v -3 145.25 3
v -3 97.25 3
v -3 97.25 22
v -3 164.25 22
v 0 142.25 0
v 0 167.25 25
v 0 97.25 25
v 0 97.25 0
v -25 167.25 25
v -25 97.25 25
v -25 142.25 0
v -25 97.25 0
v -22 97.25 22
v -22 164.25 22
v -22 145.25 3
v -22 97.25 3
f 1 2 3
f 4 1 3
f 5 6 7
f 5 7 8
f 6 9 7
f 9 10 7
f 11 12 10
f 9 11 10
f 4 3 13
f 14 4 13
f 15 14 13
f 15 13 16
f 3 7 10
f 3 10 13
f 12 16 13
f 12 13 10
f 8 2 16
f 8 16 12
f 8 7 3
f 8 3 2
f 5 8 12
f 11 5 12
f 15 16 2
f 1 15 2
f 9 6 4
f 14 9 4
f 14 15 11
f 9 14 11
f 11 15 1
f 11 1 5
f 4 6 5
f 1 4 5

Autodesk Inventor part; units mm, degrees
ref_plane "YZ Plane" through (0, 0, 0) normal (1, 0, 0) x (0, 1, 0)
ref_plane "XZ Plane" through (0, 0, 0) normal (0, 1, 0) x (-1, 0, 0)
ref_plane "XY Plane" through (0, 0, 0) normal (0, 0, 1) x (1, 0, 0)
sketch "Sketch1" plane through (0, 0, 0) normal (0, 1, 0) x (-1, 0, 0)
  line L0 (0, 0) -> (25, 0)
  line L1 (25, 0) -> (25, 25)
  line L2 (25, 25) -> (0, 25)
  line L3 (0, 25) -> (0, 0)
  line L4 (22, 22) -> (22, 3)
  line L5 (22, 3) -> (3, 3)
  line L6 (3, 3) -> (3, 22)
  line L7 (3, 22) -> (22, 22)
  dimension "d0" = 25
  dimension "d1" = 25
  dimension "d2" = 3
extrude "Extrusion1" add sketch "Sketch1" along normal blind 167.25
sketch "Sketch4" plane through (0, 0, 25) normal (1, 0, 0) x (0, 0, -1)
  line L0 (0, 0) -> (25, 0) projected
  line L1 (25, 0) -> (25, 167.25) projected
  line L2 (0, 167.25) -> (25, 167.25) projected
  line L3 (0, 0) -> (0, 167.25) projected
  line L4 (0, 167.25) -> (25, 142.25)
  line L5 (0, 167.25) -> (35.3553, 167.25) construction
  line L6 (0, 167.25) -> (0, 97.25)
  line L7 (0, 0) -> (0, 167.25) projected
  line L8 (0, 97.25) -> (25, 97.25)
  line L9 (25, 142.25) -> (25, 97.25)
  dimension "d12" = 45
  dimension "d13" = 70
extrude "Extrusion4" cut sketch "Sketch4" against normal through all contours L3 L8 L1 L0 | L2 L1 L4
properties part number "P602" material "Aluminum 6061"
